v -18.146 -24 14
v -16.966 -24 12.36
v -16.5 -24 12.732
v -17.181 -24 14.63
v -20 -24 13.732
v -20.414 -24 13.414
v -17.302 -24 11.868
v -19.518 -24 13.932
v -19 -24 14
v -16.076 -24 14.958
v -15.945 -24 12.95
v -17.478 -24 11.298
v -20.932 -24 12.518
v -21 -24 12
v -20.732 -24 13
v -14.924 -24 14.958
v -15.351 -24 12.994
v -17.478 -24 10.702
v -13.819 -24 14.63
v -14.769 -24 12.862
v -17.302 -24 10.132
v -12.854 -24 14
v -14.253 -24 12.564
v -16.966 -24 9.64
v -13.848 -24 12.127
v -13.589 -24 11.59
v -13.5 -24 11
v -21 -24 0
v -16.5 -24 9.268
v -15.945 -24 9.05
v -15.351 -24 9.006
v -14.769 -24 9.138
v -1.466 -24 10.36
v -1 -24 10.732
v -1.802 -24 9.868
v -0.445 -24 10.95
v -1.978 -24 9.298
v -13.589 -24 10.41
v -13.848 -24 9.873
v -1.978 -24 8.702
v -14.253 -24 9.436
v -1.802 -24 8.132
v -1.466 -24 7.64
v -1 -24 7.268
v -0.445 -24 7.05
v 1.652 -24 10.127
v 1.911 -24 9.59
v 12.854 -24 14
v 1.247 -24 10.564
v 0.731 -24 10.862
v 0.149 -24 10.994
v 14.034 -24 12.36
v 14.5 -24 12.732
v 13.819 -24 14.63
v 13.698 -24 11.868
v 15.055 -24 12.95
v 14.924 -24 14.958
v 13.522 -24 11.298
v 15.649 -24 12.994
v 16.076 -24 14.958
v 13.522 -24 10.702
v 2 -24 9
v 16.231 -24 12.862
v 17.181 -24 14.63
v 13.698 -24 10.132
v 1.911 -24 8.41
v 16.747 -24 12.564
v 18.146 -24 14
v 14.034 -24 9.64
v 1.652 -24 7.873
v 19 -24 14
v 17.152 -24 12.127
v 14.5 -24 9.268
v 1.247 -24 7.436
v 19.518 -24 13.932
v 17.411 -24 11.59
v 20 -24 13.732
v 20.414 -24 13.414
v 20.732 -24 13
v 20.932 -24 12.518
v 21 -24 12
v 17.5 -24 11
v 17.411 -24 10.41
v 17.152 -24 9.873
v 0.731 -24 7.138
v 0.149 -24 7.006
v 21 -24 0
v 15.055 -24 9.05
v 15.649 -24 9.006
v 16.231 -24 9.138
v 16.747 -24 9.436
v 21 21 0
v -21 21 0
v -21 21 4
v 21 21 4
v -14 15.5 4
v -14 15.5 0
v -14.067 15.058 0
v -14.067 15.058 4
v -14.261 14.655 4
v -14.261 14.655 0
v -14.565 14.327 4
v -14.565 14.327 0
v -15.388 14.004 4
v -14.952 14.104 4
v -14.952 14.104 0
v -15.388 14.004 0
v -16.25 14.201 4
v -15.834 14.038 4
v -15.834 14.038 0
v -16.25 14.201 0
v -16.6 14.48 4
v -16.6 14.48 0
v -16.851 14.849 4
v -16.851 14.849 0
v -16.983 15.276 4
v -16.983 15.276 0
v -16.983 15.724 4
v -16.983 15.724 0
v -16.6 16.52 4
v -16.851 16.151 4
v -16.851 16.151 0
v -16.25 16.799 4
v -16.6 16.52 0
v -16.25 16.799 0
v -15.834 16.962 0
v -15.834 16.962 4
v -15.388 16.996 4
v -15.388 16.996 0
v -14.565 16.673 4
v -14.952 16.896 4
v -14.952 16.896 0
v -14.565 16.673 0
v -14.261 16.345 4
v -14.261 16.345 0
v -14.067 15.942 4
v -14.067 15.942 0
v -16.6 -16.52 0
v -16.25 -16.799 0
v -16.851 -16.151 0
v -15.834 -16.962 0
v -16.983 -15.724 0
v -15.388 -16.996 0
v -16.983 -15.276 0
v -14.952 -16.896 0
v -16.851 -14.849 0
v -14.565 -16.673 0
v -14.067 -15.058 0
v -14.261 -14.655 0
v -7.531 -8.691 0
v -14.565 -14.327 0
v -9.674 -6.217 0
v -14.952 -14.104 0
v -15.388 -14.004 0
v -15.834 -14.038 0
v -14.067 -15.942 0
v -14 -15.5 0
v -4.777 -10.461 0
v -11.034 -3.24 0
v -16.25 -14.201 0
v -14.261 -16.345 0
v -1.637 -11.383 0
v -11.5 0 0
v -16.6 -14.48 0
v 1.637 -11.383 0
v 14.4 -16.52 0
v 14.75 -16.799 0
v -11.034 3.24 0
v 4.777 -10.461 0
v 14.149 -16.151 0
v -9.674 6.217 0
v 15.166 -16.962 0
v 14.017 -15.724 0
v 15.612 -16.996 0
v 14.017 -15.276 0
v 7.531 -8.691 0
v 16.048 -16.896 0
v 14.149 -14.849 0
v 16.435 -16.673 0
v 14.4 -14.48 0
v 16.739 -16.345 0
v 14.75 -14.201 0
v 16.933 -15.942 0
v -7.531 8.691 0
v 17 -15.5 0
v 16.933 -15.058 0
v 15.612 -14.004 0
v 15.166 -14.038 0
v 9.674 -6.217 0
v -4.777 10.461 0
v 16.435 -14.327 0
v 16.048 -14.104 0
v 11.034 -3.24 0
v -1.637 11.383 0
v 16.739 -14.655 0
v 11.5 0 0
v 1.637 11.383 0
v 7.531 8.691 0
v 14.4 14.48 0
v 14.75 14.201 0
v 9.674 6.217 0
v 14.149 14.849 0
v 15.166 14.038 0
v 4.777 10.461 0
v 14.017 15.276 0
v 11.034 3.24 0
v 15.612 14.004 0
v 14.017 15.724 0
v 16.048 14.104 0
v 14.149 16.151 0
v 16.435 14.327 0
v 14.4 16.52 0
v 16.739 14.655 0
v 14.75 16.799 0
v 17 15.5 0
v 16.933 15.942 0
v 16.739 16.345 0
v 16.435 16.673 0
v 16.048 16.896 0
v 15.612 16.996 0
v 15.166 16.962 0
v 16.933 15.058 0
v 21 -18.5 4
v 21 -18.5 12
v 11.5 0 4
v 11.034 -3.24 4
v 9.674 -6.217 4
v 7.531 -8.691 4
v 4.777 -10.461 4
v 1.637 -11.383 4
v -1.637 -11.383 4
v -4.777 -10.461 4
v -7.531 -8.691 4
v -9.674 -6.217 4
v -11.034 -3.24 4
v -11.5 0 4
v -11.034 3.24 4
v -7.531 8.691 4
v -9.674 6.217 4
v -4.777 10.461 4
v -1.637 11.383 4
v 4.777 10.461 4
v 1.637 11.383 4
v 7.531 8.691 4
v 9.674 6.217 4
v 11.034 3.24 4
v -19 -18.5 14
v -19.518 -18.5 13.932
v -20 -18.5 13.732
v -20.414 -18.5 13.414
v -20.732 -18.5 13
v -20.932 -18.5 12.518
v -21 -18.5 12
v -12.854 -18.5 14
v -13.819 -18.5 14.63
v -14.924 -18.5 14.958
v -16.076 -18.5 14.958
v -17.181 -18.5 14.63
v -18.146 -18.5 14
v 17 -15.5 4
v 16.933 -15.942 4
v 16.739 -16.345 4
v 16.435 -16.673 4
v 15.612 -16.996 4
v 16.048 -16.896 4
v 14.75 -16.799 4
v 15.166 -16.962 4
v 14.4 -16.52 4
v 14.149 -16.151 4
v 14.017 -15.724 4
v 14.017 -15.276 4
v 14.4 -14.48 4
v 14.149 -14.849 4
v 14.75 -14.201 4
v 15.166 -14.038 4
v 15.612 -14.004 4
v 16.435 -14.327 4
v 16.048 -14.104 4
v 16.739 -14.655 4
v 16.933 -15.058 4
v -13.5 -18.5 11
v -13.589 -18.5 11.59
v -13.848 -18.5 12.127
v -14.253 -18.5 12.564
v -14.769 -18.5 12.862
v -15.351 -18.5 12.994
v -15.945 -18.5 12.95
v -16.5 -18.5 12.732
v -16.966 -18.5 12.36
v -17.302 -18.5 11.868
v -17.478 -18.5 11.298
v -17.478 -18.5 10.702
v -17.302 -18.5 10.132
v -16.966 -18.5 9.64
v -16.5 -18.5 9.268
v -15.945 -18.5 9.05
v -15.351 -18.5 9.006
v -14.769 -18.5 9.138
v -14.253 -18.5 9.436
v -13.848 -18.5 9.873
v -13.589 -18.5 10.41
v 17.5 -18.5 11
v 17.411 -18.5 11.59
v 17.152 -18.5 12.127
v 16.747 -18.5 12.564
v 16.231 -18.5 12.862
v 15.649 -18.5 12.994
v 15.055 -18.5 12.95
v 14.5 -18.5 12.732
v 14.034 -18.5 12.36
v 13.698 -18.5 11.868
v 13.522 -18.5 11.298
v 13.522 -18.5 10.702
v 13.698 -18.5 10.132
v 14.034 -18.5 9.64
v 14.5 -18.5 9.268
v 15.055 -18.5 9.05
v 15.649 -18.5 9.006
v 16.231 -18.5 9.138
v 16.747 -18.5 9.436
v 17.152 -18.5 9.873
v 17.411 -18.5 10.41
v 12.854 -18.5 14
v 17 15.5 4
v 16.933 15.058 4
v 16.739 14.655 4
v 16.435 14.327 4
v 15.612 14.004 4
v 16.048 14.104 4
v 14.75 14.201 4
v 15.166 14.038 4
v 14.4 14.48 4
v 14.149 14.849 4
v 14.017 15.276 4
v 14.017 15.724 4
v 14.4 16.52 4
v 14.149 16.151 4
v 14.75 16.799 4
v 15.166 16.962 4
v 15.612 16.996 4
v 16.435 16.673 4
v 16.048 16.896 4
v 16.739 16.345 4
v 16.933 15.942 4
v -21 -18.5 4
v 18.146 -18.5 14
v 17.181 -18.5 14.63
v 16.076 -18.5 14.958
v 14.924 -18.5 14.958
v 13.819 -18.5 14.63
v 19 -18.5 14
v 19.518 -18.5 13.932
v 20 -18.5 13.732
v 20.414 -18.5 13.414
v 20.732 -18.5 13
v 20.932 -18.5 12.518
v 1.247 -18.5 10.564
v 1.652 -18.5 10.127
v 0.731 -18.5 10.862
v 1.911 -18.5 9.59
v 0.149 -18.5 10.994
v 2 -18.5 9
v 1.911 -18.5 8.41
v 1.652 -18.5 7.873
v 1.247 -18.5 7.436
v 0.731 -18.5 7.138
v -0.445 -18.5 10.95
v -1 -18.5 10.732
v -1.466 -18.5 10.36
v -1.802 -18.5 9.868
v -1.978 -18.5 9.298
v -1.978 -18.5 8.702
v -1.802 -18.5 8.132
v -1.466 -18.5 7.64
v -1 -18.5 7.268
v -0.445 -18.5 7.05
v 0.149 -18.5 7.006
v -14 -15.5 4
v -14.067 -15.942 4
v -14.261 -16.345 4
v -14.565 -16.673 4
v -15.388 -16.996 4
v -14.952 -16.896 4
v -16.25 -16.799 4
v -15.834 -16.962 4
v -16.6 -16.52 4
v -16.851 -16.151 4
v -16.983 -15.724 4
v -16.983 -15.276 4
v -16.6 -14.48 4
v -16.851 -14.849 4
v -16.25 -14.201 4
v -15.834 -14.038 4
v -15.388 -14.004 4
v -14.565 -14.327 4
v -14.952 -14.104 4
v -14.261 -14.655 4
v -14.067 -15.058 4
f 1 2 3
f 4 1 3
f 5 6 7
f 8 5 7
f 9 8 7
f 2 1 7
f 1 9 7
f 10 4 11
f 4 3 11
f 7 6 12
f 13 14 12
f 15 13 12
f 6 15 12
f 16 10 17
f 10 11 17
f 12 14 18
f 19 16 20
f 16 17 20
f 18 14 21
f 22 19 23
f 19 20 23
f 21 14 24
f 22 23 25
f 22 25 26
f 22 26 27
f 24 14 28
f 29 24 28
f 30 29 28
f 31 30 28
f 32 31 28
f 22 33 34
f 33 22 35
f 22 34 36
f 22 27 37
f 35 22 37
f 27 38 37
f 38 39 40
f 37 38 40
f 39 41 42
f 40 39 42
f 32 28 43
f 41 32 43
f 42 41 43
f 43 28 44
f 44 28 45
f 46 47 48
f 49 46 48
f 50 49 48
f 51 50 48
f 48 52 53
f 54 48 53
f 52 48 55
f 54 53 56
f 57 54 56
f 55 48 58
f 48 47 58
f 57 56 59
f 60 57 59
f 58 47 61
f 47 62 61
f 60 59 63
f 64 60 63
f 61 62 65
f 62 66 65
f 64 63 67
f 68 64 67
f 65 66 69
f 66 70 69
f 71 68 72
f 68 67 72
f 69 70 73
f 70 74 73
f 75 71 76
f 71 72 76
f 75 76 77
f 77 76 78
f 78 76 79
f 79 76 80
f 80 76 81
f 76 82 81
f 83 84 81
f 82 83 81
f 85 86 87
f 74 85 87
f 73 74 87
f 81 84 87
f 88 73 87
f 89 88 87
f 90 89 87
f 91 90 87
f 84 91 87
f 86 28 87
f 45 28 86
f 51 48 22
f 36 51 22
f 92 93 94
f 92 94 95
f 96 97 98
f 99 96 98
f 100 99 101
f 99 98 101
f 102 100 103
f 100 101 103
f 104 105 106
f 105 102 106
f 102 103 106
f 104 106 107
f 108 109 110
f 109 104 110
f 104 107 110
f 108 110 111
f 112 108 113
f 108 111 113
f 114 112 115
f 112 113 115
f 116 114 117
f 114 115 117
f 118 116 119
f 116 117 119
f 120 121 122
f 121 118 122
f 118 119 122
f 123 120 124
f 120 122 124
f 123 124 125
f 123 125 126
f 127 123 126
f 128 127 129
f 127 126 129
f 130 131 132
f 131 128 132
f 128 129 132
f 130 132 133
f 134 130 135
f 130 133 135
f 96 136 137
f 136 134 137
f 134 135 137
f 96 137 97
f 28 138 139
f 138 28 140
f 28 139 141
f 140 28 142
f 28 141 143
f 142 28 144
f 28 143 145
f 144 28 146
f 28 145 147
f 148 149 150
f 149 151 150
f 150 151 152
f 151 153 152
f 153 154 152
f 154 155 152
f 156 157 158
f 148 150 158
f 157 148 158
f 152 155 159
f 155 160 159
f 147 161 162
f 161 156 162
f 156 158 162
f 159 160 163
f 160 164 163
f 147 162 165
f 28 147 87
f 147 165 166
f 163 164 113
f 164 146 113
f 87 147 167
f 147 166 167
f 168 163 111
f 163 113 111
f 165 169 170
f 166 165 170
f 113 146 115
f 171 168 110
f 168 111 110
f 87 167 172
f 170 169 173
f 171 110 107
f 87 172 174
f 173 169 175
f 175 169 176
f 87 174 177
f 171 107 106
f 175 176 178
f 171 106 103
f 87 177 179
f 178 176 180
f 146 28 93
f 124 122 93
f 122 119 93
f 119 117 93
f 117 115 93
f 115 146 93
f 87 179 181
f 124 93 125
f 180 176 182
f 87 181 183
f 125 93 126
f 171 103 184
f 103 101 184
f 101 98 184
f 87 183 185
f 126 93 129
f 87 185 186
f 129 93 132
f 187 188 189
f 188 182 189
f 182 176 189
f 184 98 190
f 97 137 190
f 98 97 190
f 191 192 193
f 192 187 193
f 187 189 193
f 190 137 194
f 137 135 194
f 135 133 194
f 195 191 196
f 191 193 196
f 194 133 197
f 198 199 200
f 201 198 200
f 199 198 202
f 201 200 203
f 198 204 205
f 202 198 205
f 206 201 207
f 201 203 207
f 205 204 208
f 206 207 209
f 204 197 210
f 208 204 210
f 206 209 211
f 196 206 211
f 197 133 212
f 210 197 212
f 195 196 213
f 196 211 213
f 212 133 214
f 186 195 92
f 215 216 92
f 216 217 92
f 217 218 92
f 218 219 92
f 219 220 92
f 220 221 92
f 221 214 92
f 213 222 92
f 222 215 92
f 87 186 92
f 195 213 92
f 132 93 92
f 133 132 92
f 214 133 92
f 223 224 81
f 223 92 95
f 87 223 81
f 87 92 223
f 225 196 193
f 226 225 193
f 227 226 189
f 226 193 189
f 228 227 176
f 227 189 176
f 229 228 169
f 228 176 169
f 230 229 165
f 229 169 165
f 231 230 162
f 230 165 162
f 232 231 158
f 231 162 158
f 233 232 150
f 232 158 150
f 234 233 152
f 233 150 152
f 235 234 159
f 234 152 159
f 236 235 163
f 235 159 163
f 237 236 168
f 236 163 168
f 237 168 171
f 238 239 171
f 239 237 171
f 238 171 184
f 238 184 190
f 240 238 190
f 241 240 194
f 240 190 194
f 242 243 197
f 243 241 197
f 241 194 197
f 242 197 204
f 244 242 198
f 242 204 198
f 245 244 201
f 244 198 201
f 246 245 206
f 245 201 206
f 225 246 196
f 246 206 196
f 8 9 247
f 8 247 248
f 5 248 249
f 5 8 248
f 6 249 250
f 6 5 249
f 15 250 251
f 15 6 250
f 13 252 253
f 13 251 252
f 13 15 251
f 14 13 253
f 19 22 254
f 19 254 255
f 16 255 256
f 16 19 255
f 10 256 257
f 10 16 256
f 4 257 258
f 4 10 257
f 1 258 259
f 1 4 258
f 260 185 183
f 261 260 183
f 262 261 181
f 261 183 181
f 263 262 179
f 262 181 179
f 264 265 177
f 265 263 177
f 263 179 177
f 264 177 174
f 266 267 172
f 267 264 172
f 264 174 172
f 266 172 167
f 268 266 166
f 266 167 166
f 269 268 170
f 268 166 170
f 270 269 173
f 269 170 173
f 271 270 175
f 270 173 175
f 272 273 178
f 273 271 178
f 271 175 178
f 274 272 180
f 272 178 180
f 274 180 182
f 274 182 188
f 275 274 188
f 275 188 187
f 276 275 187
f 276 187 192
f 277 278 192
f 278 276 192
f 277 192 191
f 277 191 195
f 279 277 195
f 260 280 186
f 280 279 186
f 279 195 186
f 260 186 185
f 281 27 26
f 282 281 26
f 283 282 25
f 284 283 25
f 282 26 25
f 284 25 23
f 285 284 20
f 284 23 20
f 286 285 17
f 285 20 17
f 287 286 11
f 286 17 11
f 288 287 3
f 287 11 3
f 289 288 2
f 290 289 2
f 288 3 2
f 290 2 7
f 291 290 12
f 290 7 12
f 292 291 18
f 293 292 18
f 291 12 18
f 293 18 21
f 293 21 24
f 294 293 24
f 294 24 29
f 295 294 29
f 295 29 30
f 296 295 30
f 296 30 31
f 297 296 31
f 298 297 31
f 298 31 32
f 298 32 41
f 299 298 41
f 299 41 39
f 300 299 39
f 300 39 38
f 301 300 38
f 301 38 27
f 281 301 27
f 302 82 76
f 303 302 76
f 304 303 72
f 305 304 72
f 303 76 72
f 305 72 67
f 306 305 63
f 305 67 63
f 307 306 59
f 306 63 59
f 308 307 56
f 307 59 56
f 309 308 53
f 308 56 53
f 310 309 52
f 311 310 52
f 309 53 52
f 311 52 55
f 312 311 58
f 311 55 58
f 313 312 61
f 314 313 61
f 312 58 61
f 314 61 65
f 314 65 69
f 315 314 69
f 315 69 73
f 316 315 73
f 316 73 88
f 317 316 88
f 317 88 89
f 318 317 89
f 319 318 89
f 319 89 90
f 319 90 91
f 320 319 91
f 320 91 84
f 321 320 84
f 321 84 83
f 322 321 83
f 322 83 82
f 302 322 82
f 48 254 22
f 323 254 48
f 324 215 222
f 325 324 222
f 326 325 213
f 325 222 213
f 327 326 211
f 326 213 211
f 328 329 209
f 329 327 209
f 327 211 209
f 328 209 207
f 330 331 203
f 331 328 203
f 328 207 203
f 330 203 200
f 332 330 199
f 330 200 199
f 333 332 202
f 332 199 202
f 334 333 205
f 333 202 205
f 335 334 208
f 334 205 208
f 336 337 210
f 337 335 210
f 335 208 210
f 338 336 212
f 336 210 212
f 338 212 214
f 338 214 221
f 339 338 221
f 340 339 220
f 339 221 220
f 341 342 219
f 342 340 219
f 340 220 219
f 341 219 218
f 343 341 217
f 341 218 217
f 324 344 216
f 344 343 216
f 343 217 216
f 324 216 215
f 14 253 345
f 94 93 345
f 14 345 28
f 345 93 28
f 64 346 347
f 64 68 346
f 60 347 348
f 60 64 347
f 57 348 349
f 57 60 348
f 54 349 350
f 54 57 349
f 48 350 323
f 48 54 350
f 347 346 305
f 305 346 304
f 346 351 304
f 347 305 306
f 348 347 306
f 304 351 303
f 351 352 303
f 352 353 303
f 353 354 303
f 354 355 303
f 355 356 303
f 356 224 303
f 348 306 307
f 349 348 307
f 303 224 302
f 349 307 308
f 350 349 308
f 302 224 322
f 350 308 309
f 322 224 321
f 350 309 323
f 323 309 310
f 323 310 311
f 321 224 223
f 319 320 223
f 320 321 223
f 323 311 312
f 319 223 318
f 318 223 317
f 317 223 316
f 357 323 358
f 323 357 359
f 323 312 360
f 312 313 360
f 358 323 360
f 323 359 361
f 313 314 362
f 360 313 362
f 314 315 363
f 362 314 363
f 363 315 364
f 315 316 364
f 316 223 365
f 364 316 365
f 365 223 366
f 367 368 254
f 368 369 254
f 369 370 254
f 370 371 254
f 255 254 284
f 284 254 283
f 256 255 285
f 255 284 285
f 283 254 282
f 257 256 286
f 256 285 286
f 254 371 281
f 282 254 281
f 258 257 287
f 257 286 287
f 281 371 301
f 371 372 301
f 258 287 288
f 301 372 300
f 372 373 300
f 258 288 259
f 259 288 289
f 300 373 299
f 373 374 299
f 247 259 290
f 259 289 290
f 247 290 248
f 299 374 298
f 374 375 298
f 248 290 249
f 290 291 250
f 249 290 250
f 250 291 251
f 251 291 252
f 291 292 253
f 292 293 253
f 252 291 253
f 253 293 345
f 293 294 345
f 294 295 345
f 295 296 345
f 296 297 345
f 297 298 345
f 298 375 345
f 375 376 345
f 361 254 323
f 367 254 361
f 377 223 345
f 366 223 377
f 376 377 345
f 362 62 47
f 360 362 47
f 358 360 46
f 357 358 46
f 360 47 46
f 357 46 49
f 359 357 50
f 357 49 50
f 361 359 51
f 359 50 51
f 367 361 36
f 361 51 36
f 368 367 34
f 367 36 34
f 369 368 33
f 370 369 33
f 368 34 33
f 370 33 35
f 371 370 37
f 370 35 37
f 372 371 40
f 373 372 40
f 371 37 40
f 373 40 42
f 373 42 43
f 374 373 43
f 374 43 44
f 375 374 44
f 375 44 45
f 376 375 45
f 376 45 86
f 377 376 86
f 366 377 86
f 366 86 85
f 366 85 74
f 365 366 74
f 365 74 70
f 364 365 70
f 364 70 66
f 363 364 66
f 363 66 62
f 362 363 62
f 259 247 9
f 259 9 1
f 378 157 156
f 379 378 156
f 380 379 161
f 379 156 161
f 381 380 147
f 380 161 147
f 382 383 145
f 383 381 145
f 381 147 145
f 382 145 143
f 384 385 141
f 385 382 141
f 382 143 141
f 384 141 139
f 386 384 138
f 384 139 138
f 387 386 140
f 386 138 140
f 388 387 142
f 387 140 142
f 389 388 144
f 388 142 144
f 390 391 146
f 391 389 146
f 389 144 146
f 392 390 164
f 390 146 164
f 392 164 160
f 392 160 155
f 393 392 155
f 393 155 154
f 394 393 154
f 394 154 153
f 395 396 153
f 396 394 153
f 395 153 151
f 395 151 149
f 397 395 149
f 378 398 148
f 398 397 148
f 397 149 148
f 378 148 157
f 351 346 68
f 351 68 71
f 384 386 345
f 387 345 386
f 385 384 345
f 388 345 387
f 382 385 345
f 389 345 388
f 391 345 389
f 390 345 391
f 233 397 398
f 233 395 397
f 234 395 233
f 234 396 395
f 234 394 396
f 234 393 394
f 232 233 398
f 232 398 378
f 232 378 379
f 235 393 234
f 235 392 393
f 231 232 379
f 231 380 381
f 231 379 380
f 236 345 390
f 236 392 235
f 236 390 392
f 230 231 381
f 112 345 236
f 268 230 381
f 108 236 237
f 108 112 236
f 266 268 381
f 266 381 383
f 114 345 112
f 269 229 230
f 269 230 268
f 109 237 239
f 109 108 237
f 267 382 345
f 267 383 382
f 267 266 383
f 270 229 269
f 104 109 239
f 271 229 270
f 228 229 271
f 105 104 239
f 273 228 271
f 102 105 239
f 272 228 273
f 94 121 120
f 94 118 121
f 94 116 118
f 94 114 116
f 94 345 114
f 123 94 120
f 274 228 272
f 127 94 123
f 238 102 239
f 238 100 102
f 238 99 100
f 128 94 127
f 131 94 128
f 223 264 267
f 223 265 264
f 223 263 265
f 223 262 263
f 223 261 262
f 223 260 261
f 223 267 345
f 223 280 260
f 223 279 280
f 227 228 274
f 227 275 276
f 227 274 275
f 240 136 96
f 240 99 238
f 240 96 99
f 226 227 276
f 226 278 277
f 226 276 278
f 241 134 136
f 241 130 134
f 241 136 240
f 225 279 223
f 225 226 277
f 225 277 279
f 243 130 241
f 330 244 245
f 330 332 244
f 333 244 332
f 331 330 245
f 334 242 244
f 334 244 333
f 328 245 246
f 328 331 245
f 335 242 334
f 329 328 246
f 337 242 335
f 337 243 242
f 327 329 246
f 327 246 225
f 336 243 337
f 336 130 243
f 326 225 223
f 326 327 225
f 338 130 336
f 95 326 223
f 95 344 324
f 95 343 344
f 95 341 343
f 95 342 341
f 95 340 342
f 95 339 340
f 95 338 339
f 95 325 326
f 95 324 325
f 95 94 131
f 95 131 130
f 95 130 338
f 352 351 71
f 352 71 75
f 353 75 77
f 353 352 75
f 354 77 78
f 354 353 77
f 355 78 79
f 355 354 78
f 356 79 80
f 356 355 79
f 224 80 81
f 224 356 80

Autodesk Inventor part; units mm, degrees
ref_plane "YZ Plane" through (0, 0, 0) normal (1, 0, 0) x (0, 1, 0)
ref_plane "XZ Plane" through (0, 0, 0) normal (0, 1, 0) x (-1, 0, 0)
ref_plane "XY Plane" through (0, 0, 0) normal (0, 0, 1) x (1, 0, 0)
sketch "Sketch1" plane through (0, 0, 0) normal (0, 0, 1) x (1, 0, 0)
  circle A0 centre (0, 0) radius 11.5
  circle A1 centre (-15.5, 15.5) radius 1.5
  circle A2 centre (-15.5, -15.5) radius 1.5
  circle A3 centre (15.5, 15.5) radius 1.5
  circle A4 centre (15.5, -15.5) radius 1.5
  line L0 (-21, -24) -> (21, -24)
  line L1 (0, 20) -> (4.5462, 20) construction
  line L2 (-21, 21) -> (-1, 21)
  line L3 (1, 21) -> (21, 21)
  line L4 (-21, 21) -> (-21, 5.9161)
  line L5 (-21, -5.9161) -> (-21, -24)
  line L6 (21, 21) -> (21, 5.9161)
  line L7 (21, -5.9161) -> (21, -24)
  line L8 (-1.865, 21) -> (1.6498, 21)
  line L9 (-21, 8.451) -> (-21, -8.8551)
  line L10 (21, 10.9387) -> (21, -8.8551)
  dimension "d0" = 23
  dimension "d1" = 3
  dimension "d2" = 3
  dimension "d3" = 24
  dimension "d5" = 8.5
extrude "Extrusion1" add sketch "Sketch1" along normal blind 4
sketch "Sketch2" plane through (0, 0, 4) normal (0, 0, 1) x (1, 0, 0)
  line L0 (-21, -24) -> (21, -24) projected
  line L1 (21, -24) -> (21, 21) projected
  line L2 (-21, -24) -> (21, -24)
  line L3 (21, -24) -> (21, -18.5)
  line L4 (21, -18.5) -> (-21, -18.5)
  line L5 (-21, -18.5) -> (-21, -24)
  dimension "d9" = 5.5
extrude "Extrusion2" add sketch "Sketch2" along normal blind 10
sketch "Sketch3" plane through (-21, -24, 0) normal (0, -1, 0) x (1, 0, 0)
  line L0 (42, 0) -> (42, 14) projected
  line L1 (0, 0) -> (0, 14) projected
  circle A0 centre (5.5, 11) radius 2
  circle A1 centre (36.5, 11) radius 2
  line L2 (0, 4) -> (42, 4) projected
  circle A2 centre (21, 9) radius 2
  line L3 (0, 14) -> (42, 14) projected
  point P0 (21, 0)
  dimension "d12" = 4
  dimension "d13" = 4
  dimension "d16" = 5.5
  dimension "d17" = 5.5
  dimension "d18" = 7
  dimension "d19" = 7
  dimension "d27" = 4
  dimension "d28" = 5
sketch "Sketch4" plane through (-21, -24, 0) normal (0, -1, 0) x (1, 0, 0)
  circle A0 centre (5.5, 11) radius 2 projected
  circle A1 centre (36.5, 11) radius 2 projected
  arc A2 (8.1458, 14) -> (2.8542, 14) centre (5.5, 11) ccw
  arc A3 (39.1458, 14) -> (33.8542, 14) centre (36.5, 11) ccw
  line L0 (42, 14) -> (0, 14) projected
  line L1 (2.8542, 14) -> (8.1458, 14)
  line L2 (33.8542, 14) -> (39.1458, 14)
  point P0 (21, 0)
  dimension "d22" = 8
  dimension "d23" = 8
extrude "Extrusion4" add sketch "Sketch4" against normal blind 5.5 contours L0 A2 | A3 L0
fillet "Fillet1" radius 2 2 edges at (-21, -21.25, 14) (21, -21.25, 14)
extrude "Extrusion5" cut sketch "Sketch3" against normal blind 5.5 contours A0 | A1 | A2
properties part number "StepperMotorPlate" material "PPS Plastic"
